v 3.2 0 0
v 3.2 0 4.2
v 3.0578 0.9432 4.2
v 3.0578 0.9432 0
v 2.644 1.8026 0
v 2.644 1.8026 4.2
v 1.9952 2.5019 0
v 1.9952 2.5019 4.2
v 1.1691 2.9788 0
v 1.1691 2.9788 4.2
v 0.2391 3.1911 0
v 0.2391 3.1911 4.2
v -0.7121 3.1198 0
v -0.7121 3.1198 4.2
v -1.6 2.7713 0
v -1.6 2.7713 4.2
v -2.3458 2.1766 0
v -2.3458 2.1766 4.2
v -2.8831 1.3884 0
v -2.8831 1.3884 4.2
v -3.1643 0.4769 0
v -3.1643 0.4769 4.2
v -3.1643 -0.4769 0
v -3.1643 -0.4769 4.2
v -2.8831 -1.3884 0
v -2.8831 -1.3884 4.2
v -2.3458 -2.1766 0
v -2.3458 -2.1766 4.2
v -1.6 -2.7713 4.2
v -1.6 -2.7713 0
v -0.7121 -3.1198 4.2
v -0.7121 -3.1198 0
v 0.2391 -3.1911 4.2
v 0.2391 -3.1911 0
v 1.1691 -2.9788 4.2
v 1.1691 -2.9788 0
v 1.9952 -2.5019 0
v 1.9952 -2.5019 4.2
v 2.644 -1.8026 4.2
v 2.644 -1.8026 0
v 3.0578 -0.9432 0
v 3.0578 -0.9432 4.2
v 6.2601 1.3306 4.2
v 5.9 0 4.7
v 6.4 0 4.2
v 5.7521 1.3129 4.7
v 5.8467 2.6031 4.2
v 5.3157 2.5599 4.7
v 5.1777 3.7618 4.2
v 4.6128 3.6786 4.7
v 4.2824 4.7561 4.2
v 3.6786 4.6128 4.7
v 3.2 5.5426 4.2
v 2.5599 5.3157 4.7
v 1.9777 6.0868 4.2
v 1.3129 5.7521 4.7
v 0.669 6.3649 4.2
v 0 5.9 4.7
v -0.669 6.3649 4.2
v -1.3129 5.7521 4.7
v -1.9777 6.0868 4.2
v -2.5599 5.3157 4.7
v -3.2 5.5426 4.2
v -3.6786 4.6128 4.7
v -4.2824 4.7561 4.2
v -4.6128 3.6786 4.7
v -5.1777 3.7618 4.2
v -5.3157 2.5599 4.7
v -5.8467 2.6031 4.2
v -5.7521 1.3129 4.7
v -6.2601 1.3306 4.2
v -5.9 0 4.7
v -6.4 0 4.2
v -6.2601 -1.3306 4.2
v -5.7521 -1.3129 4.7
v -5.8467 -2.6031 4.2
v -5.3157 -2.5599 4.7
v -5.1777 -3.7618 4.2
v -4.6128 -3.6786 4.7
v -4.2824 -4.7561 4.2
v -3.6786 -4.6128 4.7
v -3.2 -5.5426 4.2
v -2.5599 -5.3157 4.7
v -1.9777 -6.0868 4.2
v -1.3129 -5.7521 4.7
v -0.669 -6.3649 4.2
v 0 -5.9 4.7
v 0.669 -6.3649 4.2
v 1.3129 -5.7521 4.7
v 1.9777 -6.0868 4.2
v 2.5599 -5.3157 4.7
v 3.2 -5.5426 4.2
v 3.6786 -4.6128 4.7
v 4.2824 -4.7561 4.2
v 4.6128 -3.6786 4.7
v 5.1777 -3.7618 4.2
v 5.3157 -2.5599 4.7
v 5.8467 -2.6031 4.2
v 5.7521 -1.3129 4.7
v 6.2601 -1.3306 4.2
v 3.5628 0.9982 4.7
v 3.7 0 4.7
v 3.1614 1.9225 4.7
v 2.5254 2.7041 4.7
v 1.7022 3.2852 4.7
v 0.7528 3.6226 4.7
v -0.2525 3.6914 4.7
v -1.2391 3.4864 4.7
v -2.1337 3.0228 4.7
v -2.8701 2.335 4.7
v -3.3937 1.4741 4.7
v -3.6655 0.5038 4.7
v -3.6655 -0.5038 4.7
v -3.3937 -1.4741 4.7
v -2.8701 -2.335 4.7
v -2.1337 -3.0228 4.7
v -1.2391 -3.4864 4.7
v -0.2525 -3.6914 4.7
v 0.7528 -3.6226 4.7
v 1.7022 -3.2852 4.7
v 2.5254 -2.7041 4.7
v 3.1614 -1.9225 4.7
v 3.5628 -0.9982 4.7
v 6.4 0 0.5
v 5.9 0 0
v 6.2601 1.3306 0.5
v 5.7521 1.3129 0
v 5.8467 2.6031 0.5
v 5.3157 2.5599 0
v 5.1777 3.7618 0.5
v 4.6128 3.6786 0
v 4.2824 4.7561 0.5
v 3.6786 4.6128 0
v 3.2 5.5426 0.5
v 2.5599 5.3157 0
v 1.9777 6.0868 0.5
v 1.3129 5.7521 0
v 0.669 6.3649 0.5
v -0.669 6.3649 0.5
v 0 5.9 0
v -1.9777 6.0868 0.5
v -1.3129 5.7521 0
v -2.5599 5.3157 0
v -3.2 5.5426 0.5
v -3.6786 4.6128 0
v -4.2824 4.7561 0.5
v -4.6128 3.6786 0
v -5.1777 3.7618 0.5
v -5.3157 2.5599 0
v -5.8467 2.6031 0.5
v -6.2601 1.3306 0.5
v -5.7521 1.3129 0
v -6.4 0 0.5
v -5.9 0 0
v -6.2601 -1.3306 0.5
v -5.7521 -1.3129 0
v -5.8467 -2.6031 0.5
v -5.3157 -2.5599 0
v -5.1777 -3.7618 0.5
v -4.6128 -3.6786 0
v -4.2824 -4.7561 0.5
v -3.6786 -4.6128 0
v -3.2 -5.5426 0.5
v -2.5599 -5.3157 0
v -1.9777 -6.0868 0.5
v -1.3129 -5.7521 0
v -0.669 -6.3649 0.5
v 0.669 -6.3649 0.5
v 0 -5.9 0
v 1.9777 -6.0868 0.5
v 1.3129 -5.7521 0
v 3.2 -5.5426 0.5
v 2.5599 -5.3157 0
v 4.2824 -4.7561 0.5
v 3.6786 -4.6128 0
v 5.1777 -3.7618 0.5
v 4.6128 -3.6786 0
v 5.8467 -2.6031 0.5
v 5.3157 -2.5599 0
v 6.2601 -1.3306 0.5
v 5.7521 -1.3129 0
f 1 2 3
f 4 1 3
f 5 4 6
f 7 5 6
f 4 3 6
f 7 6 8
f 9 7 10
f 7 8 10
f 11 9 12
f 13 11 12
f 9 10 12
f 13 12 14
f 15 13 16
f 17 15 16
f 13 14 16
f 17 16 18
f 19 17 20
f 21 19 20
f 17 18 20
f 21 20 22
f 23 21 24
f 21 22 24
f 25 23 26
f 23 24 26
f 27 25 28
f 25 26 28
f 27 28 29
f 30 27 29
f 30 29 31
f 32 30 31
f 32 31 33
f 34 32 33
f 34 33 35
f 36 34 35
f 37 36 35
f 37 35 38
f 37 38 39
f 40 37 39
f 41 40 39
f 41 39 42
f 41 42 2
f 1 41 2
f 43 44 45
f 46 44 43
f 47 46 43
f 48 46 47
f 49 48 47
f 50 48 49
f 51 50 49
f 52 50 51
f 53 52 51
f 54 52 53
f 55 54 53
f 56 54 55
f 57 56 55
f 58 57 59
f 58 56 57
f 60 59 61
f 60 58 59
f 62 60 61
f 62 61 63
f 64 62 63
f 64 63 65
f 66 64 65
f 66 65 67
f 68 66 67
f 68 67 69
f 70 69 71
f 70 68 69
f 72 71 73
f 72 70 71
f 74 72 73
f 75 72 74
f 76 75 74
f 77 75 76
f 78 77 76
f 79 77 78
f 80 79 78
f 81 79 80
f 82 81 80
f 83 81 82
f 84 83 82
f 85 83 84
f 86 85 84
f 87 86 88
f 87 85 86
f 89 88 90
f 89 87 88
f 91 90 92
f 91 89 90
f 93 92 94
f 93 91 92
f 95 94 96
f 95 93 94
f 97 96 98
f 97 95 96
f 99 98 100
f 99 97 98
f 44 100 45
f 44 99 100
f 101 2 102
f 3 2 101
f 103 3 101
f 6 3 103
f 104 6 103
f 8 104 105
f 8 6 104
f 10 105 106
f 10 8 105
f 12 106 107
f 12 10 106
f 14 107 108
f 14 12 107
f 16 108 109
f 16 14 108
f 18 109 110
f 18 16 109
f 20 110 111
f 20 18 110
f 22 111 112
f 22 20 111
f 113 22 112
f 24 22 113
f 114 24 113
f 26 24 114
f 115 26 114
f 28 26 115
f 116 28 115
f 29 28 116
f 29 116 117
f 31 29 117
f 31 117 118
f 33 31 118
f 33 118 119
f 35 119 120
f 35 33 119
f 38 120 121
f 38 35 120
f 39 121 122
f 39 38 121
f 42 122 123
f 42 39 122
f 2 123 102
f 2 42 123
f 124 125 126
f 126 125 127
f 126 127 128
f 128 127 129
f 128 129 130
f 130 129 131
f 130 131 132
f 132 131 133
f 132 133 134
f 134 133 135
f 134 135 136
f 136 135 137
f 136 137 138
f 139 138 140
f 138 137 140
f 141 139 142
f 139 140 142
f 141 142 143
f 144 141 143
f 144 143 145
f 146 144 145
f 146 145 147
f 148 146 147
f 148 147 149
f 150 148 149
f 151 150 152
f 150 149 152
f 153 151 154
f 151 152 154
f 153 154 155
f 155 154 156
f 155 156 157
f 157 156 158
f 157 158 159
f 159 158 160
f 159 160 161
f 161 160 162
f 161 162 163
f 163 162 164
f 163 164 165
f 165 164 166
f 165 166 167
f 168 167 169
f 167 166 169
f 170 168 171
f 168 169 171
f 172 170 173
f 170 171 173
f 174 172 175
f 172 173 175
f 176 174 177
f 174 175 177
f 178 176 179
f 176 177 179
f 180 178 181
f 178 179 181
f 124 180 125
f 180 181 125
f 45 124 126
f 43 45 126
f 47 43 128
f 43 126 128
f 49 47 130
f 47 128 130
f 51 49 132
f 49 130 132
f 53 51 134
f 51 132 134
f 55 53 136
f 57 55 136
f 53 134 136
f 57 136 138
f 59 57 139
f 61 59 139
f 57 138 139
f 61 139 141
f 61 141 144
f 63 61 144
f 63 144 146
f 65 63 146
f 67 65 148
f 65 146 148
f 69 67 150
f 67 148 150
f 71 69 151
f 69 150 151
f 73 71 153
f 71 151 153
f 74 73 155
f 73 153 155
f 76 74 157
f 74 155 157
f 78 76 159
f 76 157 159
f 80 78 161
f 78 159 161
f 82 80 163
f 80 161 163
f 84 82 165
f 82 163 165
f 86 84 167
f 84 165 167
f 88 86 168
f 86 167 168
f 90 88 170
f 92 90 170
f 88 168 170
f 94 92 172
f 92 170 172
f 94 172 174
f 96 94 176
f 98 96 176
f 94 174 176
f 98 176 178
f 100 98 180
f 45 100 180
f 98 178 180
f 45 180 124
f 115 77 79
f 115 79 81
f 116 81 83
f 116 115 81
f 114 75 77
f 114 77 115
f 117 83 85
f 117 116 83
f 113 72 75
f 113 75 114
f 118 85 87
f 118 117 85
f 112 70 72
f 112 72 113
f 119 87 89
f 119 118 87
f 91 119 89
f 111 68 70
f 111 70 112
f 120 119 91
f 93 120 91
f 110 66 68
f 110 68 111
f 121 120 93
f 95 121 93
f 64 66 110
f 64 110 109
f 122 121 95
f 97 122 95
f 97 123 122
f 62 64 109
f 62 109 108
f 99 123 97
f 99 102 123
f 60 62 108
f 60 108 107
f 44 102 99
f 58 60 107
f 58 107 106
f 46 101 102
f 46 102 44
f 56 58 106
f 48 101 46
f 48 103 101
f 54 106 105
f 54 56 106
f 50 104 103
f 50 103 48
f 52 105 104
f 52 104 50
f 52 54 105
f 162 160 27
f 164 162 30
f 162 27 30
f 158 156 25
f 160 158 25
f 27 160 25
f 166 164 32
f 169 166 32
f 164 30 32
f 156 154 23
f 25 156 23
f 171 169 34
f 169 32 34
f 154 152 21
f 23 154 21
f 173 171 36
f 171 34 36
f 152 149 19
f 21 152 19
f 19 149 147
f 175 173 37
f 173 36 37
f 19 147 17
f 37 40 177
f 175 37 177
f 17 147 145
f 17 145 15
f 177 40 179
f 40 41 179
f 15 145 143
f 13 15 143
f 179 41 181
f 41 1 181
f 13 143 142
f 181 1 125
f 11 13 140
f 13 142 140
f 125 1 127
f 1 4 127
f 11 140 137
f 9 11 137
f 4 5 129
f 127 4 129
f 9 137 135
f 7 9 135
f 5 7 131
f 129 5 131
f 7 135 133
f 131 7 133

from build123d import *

# Parameters (mm, degrees)
F0_R     = 6.4
F1_DEPTH = 4.7
F2_R     = 3.2
F3_DEPTH = 25
F4_SIZE  = 0.5
F5_SIZE  = 0.5


with BuildPart() as f1:
    # F0 (on Top) → F1 (new body)
    with BuildSketch(Plane.XY):
        Circle(F0_R)
    extrude(amount=F1_DEPTH)

    # F2 (on face) → F3 (cut)
    with BuildSketch(Plane.XY.offset(4.7)):
        Circle(F2_R)
    extrude(amount=-F3_DEPTH, mode=Mode.SUBTRACT)

    # F4
    f4_edges = [f1.edges().sort_by_distance(p)[0] for p in [
        (-6.4, 0, 4.7),
        (-3.2, 0, 4.7),
    ]]
    chamfer(f4_edges, length=F4_SIZE)

    # F5
    f5_edges = [f1.edges().sort_by_distance(p)[0] for p in [
        (-6.4, 0, 0),
    ]]
    chamfer(f5_edges, length=F5_SIZE)


solid = f1.part
